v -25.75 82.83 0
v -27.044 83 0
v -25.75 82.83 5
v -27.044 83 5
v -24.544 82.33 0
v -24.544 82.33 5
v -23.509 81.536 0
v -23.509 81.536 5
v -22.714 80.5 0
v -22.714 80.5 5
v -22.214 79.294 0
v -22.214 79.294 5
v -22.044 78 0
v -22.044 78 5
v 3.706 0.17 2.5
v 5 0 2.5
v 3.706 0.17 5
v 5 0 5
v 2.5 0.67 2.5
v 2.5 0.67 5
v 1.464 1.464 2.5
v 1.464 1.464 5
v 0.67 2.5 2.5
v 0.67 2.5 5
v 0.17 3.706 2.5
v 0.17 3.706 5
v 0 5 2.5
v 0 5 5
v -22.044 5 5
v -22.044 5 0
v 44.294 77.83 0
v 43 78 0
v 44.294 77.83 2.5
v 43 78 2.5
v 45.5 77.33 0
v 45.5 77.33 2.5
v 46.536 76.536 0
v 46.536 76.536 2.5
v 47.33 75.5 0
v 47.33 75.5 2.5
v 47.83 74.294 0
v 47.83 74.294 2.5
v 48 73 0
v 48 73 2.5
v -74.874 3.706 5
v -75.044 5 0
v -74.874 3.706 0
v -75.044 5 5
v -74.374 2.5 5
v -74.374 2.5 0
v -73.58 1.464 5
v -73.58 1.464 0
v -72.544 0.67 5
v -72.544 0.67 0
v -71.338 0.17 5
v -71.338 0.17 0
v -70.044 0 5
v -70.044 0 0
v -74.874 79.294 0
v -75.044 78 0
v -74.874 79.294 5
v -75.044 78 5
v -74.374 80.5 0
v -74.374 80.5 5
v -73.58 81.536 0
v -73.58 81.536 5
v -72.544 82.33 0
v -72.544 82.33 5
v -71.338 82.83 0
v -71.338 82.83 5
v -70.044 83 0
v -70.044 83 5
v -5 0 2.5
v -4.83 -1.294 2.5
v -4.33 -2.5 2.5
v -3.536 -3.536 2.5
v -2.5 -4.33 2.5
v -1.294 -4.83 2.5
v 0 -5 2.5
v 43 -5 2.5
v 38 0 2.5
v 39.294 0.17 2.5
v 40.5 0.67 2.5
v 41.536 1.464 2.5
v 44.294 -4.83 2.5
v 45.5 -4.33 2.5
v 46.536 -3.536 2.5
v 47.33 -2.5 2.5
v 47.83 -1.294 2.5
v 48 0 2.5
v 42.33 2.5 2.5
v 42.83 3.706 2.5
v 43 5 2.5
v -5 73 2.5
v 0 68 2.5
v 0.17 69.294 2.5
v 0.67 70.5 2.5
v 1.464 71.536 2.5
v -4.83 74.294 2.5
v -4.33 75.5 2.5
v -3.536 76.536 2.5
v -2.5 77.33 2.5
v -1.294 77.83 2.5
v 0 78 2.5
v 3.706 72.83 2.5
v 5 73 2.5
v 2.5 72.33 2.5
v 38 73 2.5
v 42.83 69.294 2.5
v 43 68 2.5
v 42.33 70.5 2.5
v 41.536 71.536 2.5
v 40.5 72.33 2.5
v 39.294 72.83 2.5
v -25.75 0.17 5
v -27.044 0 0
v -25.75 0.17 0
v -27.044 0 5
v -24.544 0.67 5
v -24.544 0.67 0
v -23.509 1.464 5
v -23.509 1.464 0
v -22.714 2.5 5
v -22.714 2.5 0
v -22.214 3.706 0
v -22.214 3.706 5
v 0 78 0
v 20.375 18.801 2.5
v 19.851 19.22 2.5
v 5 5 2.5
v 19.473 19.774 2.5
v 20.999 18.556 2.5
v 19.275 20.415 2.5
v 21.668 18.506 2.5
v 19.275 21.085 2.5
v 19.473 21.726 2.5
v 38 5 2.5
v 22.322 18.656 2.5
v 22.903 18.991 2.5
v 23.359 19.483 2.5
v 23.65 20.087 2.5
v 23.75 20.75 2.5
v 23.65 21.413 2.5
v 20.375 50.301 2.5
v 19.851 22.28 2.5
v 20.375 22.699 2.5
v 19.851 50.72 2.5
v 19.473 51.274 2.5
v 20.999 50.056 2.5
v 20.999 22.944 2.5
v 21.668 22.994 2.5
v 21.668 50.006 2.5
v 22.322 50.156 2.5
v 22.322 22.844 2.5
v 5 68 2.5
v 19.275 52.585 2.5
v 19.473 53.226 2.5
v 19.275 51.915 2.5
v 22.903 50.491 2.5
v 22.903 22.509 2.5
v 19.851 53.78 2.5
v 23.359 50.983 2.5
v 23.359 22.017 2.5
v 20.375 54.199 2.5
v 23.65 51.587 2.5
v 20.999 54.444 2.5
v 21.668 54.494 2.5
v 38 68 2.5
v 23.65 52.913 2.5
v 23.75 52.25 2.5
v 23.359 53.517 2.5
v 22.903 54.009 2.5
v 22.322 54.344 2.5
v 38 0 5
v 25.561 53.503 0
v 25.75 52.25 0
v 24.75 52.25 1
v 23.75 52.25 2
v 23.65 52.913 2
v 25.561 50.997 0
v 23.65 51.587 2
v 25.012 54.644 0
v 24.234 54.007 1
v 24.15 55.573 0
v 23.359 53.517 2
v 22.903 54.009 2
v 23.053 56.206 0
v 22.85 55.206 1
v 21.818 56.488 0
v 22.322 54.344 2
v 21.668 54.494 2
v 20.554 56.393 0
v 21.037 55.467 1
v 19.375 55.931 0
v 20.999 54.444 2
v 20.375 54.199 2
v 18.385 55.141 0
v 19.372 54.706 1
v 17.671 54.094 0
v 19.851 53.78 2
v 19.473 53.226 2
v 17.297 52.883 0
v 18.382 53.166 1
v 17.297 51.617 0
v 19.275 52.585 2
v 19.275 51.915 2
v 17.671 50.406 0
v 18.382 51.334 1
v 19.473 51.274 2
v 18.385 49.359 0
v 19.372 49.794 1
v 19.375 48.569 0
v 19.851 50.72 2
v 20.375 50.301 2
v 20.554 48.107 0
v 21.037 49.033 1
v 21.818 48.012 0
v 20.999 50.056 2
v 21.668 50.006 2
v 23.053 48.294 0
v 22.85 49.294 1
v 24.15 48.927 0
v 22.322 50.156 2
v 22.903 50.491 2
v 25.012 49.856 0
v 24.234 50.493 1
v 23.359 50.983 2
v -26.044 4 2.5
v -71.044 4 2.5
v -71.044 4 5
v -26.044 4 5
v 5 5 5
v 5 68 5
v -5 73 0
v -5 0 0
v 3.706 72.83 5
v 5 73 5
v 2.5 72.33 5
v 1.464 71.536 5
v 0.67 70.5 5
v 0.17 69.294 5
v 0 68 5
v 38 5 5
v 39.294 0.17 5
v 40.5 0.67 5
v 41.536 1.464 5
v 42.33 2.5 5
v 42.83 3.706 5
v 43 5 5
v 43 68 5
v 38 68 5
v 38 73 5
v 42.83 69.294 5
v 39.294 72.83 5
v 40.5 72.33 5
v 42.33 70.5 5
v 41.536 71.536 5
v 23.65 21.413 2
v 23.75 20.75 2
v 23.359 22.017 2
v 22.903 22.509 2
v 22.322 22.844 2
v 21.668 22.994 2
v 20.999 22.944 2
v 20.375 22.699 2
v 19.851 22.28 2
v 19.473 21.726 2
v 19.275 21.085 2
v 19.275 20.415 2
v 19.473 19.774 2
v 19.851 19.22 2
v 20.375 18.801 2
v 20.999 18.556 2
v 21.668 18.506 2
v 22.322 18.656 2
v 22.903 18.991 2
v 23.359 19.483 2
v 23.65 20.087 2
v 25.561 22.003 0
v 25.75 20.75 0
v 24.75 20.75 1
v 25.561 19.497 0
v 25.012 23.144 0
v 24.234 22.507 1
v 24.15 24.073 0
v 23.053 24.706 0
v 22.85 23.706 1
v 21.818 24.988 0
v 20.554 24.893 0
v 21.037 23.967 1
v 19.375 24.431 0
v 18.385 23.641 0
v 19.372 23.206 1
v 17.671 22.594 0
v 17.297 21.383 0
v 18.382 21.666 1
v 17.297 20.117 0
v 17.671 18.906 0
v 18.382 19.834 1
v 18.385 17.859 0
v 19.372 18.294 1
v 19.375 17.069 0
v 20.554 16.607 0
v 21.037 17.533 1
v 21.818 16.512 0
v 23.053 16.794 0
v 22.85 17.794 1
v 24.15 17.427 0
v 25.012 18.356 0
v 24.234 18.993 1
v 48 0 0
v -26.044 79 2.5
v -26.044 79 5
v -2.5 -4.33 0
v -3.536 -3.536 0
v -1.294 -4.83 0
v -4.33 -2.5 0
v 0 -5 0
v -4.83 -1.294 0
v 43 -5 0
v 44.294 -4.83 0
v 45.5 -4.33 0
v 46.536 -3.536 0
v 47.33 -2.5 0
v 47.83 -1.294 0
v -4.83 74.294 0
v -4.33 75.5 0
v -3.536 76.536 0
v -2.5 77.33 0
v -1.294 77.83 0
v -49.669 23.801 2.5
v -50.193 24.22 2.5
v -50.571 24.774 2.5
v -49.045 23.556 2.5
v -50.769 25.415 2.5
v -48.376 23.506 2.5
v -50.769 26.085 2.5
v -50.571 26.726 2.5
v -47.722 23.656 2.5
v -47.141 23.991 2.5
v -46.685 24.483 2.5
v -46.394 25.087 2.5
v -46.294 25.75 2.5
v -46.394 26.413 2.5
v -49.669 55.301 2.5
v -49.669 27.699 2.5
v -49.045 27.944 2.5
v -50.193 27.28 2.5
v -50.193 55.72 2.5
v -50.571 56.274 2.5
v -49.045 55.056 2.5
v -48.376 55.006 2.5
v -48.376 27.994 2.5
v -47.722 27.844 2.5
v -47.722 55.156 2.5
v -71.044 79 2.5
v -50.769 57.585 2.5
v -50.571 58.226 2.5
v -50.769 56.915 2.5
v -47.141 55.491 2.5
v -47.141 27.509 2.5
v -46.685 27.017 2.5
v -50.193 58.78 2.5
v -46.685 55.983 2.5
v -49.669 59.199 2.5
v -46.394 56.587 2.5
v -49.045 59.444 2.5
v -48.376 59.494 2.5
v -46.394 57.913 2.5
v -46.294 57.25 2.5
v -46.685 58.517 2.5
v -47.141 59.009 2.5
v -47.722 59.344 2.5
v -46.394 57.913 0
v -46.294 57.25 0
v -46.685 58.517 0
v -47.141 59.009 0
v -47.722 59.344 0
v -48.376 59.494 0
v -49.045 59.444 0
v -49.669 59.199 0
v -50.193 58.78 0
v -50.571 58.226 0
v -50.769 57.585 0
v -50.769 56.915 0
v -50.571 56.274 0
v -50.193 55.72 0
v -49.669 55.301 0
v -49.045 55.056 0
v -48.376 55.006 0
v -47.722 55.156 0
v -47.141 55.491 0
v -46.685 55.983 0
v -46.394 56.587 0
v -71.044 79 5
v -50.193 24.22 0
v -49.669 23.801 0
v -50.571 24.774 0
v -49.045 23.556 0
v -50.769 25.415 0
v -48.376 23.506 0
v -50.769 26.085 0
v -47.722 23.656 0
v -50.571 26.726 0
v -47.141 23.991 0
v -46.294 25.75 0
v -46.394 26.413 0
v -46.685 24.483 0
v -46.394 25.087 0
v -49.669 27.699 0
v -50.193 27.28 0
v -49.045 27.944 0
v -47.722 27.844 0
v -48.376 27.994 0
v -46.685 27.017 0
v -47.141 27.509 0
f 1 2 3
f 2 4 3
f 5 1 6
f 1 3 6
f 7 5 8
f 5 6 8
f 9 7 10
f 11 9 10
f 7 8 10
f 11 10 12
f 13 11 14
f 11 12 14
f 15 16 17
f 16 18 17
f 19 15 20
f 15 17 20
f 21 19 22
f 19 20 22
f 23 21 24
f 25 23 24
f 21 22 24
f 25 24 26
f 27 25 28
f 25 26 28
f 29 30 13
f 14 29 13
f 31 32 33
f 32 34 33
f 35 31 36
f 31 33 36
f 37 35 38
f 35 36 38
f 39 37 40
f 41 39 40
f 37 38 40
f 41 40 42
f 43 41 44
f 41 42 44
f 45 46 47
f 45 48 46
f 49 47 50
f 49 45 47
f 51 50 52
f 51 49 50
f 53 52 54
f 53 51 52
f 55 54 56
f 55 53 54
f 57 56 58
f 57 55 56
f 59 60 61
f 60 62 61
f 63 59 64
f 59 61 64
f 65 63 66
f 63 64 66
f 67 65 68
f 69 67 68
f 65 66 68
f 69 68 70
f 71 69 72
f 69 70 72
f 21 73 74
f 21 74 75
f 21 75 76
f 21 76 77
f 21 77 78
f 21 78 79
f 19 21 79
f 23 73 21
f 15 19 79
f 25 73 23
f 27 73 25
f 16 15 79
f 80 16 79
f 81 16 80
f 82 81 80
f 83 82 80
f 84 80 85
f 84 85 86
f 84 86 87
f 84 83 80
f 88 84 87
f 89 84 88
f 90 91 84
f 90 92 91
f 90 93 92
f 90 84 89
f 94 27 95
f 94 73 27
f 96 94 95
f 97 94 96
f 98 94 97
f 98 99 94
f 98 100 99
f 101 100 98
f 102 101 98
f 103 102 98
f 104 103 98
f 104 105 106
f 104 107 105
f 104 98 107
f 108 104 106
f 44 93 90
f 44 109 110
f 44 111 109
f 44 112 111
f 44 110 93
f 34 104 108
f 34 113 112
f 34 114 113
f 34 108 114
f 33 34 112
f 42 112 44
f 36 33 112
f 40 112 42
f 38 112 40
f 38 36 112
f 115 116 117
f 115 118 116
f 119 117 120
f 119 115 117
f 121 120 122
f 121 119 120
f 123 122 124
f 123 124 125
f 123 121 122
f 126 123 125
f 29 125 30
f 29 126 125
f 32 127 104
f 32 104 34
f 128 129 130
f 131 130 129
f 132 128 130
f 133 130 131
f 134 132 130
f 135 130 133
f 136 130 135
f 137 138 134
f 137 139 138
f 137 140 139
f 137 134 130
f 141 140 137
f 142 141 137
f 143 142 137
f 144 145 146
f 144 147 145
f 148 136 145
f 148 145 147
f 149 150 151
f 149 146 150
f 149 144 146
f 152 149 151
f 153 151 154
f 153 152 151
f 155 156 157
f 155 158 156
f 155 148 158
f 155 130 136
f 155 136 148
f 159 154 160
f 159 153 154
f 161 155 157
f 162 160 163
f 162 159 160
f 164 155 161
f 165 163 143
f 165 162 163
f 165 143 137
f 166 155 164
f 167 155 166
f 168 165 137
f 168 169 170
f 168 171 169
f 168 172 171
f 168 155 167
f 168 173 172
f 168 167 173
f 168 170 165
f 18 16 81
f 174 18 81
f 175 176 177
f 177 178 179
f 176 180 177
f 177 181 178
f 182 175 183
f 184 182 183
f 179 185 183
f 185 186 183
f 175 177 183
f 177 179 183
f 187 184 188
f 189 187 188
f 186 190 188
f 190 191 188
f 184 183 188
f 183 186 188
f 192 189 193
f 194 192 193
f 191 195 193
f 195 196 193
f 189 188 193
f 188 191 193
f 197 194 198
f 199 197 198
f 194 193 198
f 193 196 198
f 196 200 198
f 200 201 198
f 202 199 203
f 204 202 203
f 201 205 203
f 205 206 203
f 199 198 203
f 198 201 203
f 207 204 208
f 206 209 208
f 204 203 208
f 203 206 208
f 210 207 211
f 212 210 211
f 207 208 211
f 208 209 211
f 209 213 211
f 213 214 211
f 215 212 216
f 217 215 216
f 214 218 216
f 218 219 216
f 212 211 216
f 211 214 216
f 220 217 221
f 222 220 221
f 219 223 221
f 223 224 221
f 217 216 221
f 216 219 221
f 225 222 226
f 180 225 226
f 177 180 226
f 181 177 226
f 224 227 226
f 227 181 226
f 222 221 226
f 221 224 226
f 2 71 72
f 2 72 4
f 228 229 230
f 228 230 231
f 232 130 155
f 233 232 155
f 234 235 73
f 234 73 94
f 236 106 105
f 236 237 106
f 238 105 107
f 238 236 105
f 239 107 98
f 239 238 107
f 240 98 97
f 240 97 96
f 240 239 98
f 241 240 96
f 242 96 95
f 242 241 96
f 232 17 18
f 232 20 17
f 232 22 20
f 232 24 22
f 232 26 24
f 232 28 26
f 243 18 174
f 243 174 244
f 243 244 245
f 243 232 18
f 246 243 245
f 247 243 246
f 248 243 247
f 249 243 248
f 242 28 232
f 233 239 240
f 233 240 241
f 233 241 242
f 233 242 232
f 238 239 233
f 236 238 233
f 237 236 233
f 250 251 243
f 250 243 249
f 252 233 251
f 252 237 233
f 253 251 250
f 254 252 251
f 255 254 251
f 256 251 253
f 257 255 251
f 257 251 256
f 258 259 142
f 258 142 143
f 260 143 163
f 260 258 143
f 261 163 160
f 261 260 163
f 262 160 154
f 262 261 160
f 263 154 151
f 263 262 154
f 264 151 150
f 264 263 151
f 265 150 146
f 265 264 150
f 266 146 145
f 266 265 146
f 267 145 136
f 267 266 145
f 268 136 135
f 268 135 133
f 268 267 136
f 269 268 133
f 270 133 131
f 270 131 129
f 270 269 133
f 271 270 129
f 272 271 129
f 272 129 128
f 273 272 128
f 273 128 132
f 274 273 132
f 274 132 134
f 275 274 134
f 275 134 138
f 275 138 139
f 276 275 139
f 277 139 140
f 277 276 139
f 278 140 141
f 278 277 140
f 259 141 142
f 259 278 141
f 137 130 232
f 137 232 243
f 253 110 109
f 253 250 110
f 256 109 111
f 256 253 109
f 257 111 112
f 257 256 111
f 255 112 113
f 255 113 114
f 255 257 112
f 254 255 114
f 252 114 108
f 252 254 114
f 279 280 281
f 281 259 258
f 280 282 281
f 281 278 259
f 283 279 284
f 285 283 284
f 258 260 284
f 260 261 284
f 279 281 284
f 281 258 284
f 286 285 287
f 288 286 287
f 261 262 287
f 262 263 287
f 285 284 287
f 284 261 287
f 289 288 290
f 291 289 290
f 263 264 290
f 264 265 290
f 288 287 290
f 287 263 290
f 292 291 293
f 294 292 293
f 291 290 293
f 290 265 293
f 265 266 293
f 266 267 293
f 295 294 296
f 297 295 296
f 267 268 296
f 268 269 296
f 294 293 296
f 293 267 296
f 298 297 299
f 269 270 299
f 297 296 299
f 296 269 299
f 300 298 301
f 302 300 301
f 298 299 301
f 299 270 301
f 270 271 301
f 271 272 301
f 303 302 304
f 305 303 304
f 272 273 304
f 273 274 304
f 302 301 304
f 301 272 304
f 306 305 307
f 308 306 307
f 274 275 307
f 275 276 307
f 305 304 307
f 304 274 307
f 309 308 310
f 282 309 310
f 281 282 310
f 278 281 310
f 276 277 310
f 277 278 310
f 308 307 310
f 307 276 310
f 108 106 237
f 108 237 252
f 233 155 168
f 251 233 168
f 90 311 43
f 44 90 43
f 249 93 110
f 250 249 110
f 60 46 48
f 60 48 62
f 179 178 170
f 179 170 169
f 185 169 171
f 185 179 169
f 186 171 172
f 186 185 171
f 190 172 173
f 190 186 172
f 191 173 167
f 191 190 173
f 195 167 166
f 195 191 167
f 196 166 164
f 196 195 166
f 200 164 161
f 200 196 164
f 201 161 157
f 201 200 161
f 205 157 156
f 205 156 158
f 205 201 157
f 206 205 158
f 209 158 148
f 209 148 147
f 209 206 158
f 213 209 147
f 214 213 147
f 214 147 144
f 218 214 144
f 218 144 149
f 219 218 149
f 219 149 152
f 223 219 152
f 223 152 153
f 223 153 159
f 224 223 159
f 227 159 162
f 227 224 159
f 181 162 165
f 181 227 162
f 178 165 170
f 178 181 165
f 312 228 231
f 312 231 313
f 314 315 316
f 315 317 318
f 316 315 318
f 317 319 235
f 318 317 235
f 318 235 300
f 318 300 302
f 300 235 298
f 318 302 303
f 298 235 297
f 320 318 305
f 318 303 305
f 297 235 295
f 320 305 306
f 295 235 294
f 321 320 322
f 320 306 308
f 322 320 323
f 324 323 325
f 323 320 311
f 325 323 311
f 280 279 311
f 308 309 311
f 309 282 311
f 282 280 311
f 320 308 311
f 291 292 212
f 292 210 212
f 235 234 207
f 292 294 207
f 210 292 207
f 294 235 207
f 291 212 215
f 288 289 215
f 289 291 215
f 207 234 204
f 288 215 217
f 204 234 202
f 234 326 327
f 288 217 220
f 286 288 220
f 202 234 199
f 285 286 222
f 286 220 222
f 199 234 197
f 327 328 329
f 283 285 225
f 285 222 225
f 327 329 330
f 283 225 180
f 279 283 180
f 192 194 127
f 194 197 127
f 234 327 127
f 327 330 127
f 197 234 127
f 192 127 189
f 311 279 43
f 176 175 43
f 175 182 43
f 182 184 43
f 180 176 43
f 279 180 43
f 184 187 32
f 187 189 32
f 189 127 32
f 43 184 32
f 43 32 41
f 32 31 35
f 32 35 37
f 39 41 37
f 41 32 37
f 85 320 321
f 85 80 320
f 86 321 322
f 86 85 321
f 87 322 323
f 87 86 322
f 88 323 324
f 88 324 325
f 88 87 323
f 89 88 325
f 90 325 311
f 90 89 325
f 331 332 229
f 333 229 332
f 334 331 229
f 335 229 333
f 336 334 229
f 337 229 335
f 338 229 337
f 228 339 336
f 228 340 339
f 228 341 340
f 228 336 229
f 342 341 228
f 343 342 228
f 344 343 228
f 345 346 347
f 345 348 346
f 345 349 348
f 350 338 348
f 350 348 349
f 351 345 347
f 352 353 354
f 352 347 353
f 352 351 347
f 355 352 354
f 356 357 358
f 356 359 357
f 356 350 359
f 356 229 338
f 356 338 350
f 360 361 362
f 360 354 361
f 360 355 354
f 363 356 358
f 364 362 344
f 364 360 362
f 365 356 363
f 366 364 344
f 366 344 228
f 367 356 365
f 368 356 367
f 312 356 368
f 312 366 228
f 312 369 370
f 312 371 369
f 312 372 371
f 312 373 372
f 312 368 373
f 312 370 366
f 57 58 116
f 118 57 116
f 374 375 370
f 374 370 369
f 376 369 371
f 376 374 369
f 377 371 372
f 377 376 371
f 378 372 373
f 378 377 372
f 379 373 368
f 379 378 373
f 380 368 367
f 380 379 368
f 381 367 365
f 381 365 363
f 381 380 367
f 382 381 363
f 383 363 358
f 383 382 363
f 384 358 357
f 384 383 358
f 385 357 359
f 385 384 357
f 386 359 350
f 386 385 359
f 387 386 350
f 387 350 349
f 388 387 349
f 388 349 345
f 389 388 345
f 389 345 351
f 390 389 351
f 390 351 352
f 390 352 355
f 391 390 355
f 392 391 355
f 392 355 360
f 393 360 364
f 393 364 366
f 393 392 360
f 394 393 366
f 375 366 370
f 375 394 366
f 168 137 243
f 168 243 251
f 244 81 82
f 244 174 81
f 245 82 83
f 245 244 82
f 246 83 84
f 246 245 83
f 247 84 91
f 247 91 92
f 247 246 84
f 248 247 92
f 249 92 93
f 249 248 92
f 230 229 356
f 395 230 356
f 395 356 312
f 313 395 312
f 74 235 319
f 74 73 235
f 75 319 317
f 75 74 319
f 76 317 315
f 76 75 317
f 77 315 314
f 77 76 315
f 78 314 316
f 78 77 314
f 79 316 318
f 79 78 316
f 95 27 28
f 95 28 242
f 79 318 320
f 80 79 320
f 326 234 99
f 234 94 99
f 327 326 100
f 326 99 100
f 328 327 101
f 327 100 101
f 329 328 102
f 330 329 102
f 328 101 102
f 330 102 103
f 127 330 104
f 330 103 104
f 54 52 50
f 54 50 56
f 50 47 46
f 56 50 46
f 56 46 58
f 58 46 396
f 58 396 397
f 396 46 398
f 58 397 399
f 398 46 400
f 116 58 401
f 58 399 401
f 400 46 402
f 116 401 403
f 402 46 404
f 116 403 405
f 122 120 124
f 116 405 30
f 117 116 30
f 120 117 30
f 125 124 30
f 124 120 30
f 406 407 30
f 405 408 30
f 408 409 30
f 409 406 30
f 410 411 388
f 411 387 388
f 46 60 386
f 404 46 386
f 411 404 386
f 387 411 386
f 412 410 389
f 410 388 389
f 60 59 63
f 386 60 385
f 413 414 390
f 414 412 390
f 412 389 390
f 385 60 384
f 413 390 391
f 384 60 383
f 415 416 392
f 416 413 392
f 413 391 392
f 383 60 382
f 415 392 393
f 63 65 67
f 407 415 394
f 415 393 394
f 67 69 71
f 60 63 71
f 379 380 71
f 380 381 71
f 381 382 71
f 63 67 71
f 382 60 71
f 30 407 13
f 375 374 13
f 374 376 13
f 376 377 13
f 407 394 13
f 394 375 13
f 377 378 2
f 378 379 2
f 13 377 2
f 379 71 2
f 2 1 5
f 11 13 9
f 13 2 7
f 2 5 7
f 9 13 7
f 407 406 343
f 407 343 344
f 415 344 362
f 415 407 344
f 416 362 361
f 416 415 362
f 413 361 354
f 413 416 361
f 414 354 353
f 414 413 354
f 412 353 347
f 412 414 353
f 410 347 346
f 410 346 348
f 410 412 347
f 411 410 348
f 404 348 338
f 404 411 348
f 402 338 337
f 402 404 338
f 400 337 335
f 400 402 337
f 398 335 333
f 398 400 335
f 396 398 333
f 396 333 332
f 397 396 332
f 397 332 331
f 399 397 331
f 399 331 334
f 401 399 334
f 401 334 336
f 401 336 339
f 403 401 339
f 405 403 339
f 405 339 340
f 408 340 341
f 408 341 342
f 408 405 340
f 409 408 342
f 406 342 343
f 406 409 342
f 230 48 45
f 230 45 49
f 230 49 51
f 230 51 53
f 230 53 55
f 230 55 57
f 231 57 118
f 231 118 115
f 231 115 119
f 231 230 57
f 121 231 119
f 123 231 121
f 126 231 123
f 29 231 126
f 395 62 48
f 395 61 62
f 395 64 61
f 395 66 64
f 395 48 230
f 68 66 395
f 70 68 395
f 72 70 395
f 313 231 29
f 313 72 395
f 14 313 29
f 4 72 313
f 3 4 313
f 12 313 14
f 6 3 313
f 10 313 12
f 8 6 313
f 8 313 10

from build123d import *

# Parameters (mm, degrees)
F0_W     = 43
F0_H     = 73
F0_W_2   = 32.9999975562
F0_H_2   = 62.9999975562
F1_DEPTH = 5
F0_W_3   = 53
F0_H_3   = 83
F0_W_4   = 45
F0_H_4   = 75
F0_W_5   = 53.0000032187
F0_H_5   = 83.0000032187
F0_R     = 2.25
F2_DEPTH = 2.5
F3_R     = 5
F3_2_R   = 5
F4_SIZE  = 2
F5_DEPTH = 2.5


with BuildPart() as f1:
    # F0 (on Top) → F1 (new body)
    with BuildSketch(Plane.XY):
        with Locations((21.5, 36.5)):
            Rectangle(F0_W, F0_H)
        with Locations((21.5, 36.5)):
            Rectangle(F0_W_2, F0_H_2, mode=Mode.SUBTRACT)
    extrude(amount=F1_DEPTH)

    # F0 (on Top) → F2 (join)
    with BuildSketch(Plane.XY):
        with Locations((21.5, 36.5)):
            Rectangle(F0_W_5, F0_H_5)
        with Locations((21.5, 36.5)):
            Rectangle(F0_W, F0_H, mode=Mode.SUBTRACT)
        with Locations((21.5, 36.5)):
            Rectangle(F0_W_2, F0_H_2)
        with Locations((21.5, 20.7500006109)):
            Circle(F0_R, mode=Mode.SUBTRACT)
        with Locations((21.5, 52.2499993891)):
            Circle(F0_R, mode=Mode.SUBTRACT)
    extrude(amount=F2_DEPTH)

    # F3
    f3_edges = [f1.edges().sort_by_distance(p)[0] for p in [
        (-5.000002, 78.000002, 1.25),
        (0, 73, 3.75),
        (43, 73, 3.75),
        (48.000002, 78.000002, 1.25),
        (-5.000002, -5.000002, 1.25),
        (0, 0, 3.75),
        (48.000002, -5.000002, 1.25),
        (43, 0, 3.75),
    ]]
    fillet(f3_edges, radius=F3_R)

    # F4
    f4_edges = [f1.edges().sort_by_distance(p)[0] for p in [
        (19.25, 52.249999, 0),
        (19.25, 20.750001, 0),
    ]]
    chamfer(f4_edges, length=F4_SIZE)


with BuildPart() as f1b:
    # F0 (on Top) → F1, piece 2 (new body)
    with BuildSketch(Plane.XY):
        with Locations((-48.5440433621, 41.5)):
            Rectangle(F0_W_3, F0_H_3)
        with Locations((-48.5440433621, 41.5)):
            Rectangle(F0_W_4, F0_H_4, mode=Mode.SUBTRACT)
    extrude(amount=F1_DEPTH)

    # F3#2
    f3_2_edges = [f1b.edges().sort_by_distance(p)[0] for p in [
        (-75.044043, 83, 2.5),
        (-22.044043, 83, 2.5),
        (-75.044043, 0, 2.5),
        (-22.044043, 0, 2.5),
    ]]
    fillet(f3_2_edges, radius=F3_2_R)

    # F0 (on Top) → F5 (join)
    with BuildSketch(Plane.XY):
        with Locations((-48.5440433621, 41.5)):
            Rectangle(F0_W_4, F0_H_4)
        with Locations((-48.5440433621, 25.75)):
            Circle(F0_R, mode=Mode.SUBTRACT)
        with Locations((-48.5440433621, 57.25)):
            Circle(F0_R, mode=Mode.SUBTRACT)
    extrude(amount=F5_DEPTH)


solid = Compound([f1.part, f1b.part])
